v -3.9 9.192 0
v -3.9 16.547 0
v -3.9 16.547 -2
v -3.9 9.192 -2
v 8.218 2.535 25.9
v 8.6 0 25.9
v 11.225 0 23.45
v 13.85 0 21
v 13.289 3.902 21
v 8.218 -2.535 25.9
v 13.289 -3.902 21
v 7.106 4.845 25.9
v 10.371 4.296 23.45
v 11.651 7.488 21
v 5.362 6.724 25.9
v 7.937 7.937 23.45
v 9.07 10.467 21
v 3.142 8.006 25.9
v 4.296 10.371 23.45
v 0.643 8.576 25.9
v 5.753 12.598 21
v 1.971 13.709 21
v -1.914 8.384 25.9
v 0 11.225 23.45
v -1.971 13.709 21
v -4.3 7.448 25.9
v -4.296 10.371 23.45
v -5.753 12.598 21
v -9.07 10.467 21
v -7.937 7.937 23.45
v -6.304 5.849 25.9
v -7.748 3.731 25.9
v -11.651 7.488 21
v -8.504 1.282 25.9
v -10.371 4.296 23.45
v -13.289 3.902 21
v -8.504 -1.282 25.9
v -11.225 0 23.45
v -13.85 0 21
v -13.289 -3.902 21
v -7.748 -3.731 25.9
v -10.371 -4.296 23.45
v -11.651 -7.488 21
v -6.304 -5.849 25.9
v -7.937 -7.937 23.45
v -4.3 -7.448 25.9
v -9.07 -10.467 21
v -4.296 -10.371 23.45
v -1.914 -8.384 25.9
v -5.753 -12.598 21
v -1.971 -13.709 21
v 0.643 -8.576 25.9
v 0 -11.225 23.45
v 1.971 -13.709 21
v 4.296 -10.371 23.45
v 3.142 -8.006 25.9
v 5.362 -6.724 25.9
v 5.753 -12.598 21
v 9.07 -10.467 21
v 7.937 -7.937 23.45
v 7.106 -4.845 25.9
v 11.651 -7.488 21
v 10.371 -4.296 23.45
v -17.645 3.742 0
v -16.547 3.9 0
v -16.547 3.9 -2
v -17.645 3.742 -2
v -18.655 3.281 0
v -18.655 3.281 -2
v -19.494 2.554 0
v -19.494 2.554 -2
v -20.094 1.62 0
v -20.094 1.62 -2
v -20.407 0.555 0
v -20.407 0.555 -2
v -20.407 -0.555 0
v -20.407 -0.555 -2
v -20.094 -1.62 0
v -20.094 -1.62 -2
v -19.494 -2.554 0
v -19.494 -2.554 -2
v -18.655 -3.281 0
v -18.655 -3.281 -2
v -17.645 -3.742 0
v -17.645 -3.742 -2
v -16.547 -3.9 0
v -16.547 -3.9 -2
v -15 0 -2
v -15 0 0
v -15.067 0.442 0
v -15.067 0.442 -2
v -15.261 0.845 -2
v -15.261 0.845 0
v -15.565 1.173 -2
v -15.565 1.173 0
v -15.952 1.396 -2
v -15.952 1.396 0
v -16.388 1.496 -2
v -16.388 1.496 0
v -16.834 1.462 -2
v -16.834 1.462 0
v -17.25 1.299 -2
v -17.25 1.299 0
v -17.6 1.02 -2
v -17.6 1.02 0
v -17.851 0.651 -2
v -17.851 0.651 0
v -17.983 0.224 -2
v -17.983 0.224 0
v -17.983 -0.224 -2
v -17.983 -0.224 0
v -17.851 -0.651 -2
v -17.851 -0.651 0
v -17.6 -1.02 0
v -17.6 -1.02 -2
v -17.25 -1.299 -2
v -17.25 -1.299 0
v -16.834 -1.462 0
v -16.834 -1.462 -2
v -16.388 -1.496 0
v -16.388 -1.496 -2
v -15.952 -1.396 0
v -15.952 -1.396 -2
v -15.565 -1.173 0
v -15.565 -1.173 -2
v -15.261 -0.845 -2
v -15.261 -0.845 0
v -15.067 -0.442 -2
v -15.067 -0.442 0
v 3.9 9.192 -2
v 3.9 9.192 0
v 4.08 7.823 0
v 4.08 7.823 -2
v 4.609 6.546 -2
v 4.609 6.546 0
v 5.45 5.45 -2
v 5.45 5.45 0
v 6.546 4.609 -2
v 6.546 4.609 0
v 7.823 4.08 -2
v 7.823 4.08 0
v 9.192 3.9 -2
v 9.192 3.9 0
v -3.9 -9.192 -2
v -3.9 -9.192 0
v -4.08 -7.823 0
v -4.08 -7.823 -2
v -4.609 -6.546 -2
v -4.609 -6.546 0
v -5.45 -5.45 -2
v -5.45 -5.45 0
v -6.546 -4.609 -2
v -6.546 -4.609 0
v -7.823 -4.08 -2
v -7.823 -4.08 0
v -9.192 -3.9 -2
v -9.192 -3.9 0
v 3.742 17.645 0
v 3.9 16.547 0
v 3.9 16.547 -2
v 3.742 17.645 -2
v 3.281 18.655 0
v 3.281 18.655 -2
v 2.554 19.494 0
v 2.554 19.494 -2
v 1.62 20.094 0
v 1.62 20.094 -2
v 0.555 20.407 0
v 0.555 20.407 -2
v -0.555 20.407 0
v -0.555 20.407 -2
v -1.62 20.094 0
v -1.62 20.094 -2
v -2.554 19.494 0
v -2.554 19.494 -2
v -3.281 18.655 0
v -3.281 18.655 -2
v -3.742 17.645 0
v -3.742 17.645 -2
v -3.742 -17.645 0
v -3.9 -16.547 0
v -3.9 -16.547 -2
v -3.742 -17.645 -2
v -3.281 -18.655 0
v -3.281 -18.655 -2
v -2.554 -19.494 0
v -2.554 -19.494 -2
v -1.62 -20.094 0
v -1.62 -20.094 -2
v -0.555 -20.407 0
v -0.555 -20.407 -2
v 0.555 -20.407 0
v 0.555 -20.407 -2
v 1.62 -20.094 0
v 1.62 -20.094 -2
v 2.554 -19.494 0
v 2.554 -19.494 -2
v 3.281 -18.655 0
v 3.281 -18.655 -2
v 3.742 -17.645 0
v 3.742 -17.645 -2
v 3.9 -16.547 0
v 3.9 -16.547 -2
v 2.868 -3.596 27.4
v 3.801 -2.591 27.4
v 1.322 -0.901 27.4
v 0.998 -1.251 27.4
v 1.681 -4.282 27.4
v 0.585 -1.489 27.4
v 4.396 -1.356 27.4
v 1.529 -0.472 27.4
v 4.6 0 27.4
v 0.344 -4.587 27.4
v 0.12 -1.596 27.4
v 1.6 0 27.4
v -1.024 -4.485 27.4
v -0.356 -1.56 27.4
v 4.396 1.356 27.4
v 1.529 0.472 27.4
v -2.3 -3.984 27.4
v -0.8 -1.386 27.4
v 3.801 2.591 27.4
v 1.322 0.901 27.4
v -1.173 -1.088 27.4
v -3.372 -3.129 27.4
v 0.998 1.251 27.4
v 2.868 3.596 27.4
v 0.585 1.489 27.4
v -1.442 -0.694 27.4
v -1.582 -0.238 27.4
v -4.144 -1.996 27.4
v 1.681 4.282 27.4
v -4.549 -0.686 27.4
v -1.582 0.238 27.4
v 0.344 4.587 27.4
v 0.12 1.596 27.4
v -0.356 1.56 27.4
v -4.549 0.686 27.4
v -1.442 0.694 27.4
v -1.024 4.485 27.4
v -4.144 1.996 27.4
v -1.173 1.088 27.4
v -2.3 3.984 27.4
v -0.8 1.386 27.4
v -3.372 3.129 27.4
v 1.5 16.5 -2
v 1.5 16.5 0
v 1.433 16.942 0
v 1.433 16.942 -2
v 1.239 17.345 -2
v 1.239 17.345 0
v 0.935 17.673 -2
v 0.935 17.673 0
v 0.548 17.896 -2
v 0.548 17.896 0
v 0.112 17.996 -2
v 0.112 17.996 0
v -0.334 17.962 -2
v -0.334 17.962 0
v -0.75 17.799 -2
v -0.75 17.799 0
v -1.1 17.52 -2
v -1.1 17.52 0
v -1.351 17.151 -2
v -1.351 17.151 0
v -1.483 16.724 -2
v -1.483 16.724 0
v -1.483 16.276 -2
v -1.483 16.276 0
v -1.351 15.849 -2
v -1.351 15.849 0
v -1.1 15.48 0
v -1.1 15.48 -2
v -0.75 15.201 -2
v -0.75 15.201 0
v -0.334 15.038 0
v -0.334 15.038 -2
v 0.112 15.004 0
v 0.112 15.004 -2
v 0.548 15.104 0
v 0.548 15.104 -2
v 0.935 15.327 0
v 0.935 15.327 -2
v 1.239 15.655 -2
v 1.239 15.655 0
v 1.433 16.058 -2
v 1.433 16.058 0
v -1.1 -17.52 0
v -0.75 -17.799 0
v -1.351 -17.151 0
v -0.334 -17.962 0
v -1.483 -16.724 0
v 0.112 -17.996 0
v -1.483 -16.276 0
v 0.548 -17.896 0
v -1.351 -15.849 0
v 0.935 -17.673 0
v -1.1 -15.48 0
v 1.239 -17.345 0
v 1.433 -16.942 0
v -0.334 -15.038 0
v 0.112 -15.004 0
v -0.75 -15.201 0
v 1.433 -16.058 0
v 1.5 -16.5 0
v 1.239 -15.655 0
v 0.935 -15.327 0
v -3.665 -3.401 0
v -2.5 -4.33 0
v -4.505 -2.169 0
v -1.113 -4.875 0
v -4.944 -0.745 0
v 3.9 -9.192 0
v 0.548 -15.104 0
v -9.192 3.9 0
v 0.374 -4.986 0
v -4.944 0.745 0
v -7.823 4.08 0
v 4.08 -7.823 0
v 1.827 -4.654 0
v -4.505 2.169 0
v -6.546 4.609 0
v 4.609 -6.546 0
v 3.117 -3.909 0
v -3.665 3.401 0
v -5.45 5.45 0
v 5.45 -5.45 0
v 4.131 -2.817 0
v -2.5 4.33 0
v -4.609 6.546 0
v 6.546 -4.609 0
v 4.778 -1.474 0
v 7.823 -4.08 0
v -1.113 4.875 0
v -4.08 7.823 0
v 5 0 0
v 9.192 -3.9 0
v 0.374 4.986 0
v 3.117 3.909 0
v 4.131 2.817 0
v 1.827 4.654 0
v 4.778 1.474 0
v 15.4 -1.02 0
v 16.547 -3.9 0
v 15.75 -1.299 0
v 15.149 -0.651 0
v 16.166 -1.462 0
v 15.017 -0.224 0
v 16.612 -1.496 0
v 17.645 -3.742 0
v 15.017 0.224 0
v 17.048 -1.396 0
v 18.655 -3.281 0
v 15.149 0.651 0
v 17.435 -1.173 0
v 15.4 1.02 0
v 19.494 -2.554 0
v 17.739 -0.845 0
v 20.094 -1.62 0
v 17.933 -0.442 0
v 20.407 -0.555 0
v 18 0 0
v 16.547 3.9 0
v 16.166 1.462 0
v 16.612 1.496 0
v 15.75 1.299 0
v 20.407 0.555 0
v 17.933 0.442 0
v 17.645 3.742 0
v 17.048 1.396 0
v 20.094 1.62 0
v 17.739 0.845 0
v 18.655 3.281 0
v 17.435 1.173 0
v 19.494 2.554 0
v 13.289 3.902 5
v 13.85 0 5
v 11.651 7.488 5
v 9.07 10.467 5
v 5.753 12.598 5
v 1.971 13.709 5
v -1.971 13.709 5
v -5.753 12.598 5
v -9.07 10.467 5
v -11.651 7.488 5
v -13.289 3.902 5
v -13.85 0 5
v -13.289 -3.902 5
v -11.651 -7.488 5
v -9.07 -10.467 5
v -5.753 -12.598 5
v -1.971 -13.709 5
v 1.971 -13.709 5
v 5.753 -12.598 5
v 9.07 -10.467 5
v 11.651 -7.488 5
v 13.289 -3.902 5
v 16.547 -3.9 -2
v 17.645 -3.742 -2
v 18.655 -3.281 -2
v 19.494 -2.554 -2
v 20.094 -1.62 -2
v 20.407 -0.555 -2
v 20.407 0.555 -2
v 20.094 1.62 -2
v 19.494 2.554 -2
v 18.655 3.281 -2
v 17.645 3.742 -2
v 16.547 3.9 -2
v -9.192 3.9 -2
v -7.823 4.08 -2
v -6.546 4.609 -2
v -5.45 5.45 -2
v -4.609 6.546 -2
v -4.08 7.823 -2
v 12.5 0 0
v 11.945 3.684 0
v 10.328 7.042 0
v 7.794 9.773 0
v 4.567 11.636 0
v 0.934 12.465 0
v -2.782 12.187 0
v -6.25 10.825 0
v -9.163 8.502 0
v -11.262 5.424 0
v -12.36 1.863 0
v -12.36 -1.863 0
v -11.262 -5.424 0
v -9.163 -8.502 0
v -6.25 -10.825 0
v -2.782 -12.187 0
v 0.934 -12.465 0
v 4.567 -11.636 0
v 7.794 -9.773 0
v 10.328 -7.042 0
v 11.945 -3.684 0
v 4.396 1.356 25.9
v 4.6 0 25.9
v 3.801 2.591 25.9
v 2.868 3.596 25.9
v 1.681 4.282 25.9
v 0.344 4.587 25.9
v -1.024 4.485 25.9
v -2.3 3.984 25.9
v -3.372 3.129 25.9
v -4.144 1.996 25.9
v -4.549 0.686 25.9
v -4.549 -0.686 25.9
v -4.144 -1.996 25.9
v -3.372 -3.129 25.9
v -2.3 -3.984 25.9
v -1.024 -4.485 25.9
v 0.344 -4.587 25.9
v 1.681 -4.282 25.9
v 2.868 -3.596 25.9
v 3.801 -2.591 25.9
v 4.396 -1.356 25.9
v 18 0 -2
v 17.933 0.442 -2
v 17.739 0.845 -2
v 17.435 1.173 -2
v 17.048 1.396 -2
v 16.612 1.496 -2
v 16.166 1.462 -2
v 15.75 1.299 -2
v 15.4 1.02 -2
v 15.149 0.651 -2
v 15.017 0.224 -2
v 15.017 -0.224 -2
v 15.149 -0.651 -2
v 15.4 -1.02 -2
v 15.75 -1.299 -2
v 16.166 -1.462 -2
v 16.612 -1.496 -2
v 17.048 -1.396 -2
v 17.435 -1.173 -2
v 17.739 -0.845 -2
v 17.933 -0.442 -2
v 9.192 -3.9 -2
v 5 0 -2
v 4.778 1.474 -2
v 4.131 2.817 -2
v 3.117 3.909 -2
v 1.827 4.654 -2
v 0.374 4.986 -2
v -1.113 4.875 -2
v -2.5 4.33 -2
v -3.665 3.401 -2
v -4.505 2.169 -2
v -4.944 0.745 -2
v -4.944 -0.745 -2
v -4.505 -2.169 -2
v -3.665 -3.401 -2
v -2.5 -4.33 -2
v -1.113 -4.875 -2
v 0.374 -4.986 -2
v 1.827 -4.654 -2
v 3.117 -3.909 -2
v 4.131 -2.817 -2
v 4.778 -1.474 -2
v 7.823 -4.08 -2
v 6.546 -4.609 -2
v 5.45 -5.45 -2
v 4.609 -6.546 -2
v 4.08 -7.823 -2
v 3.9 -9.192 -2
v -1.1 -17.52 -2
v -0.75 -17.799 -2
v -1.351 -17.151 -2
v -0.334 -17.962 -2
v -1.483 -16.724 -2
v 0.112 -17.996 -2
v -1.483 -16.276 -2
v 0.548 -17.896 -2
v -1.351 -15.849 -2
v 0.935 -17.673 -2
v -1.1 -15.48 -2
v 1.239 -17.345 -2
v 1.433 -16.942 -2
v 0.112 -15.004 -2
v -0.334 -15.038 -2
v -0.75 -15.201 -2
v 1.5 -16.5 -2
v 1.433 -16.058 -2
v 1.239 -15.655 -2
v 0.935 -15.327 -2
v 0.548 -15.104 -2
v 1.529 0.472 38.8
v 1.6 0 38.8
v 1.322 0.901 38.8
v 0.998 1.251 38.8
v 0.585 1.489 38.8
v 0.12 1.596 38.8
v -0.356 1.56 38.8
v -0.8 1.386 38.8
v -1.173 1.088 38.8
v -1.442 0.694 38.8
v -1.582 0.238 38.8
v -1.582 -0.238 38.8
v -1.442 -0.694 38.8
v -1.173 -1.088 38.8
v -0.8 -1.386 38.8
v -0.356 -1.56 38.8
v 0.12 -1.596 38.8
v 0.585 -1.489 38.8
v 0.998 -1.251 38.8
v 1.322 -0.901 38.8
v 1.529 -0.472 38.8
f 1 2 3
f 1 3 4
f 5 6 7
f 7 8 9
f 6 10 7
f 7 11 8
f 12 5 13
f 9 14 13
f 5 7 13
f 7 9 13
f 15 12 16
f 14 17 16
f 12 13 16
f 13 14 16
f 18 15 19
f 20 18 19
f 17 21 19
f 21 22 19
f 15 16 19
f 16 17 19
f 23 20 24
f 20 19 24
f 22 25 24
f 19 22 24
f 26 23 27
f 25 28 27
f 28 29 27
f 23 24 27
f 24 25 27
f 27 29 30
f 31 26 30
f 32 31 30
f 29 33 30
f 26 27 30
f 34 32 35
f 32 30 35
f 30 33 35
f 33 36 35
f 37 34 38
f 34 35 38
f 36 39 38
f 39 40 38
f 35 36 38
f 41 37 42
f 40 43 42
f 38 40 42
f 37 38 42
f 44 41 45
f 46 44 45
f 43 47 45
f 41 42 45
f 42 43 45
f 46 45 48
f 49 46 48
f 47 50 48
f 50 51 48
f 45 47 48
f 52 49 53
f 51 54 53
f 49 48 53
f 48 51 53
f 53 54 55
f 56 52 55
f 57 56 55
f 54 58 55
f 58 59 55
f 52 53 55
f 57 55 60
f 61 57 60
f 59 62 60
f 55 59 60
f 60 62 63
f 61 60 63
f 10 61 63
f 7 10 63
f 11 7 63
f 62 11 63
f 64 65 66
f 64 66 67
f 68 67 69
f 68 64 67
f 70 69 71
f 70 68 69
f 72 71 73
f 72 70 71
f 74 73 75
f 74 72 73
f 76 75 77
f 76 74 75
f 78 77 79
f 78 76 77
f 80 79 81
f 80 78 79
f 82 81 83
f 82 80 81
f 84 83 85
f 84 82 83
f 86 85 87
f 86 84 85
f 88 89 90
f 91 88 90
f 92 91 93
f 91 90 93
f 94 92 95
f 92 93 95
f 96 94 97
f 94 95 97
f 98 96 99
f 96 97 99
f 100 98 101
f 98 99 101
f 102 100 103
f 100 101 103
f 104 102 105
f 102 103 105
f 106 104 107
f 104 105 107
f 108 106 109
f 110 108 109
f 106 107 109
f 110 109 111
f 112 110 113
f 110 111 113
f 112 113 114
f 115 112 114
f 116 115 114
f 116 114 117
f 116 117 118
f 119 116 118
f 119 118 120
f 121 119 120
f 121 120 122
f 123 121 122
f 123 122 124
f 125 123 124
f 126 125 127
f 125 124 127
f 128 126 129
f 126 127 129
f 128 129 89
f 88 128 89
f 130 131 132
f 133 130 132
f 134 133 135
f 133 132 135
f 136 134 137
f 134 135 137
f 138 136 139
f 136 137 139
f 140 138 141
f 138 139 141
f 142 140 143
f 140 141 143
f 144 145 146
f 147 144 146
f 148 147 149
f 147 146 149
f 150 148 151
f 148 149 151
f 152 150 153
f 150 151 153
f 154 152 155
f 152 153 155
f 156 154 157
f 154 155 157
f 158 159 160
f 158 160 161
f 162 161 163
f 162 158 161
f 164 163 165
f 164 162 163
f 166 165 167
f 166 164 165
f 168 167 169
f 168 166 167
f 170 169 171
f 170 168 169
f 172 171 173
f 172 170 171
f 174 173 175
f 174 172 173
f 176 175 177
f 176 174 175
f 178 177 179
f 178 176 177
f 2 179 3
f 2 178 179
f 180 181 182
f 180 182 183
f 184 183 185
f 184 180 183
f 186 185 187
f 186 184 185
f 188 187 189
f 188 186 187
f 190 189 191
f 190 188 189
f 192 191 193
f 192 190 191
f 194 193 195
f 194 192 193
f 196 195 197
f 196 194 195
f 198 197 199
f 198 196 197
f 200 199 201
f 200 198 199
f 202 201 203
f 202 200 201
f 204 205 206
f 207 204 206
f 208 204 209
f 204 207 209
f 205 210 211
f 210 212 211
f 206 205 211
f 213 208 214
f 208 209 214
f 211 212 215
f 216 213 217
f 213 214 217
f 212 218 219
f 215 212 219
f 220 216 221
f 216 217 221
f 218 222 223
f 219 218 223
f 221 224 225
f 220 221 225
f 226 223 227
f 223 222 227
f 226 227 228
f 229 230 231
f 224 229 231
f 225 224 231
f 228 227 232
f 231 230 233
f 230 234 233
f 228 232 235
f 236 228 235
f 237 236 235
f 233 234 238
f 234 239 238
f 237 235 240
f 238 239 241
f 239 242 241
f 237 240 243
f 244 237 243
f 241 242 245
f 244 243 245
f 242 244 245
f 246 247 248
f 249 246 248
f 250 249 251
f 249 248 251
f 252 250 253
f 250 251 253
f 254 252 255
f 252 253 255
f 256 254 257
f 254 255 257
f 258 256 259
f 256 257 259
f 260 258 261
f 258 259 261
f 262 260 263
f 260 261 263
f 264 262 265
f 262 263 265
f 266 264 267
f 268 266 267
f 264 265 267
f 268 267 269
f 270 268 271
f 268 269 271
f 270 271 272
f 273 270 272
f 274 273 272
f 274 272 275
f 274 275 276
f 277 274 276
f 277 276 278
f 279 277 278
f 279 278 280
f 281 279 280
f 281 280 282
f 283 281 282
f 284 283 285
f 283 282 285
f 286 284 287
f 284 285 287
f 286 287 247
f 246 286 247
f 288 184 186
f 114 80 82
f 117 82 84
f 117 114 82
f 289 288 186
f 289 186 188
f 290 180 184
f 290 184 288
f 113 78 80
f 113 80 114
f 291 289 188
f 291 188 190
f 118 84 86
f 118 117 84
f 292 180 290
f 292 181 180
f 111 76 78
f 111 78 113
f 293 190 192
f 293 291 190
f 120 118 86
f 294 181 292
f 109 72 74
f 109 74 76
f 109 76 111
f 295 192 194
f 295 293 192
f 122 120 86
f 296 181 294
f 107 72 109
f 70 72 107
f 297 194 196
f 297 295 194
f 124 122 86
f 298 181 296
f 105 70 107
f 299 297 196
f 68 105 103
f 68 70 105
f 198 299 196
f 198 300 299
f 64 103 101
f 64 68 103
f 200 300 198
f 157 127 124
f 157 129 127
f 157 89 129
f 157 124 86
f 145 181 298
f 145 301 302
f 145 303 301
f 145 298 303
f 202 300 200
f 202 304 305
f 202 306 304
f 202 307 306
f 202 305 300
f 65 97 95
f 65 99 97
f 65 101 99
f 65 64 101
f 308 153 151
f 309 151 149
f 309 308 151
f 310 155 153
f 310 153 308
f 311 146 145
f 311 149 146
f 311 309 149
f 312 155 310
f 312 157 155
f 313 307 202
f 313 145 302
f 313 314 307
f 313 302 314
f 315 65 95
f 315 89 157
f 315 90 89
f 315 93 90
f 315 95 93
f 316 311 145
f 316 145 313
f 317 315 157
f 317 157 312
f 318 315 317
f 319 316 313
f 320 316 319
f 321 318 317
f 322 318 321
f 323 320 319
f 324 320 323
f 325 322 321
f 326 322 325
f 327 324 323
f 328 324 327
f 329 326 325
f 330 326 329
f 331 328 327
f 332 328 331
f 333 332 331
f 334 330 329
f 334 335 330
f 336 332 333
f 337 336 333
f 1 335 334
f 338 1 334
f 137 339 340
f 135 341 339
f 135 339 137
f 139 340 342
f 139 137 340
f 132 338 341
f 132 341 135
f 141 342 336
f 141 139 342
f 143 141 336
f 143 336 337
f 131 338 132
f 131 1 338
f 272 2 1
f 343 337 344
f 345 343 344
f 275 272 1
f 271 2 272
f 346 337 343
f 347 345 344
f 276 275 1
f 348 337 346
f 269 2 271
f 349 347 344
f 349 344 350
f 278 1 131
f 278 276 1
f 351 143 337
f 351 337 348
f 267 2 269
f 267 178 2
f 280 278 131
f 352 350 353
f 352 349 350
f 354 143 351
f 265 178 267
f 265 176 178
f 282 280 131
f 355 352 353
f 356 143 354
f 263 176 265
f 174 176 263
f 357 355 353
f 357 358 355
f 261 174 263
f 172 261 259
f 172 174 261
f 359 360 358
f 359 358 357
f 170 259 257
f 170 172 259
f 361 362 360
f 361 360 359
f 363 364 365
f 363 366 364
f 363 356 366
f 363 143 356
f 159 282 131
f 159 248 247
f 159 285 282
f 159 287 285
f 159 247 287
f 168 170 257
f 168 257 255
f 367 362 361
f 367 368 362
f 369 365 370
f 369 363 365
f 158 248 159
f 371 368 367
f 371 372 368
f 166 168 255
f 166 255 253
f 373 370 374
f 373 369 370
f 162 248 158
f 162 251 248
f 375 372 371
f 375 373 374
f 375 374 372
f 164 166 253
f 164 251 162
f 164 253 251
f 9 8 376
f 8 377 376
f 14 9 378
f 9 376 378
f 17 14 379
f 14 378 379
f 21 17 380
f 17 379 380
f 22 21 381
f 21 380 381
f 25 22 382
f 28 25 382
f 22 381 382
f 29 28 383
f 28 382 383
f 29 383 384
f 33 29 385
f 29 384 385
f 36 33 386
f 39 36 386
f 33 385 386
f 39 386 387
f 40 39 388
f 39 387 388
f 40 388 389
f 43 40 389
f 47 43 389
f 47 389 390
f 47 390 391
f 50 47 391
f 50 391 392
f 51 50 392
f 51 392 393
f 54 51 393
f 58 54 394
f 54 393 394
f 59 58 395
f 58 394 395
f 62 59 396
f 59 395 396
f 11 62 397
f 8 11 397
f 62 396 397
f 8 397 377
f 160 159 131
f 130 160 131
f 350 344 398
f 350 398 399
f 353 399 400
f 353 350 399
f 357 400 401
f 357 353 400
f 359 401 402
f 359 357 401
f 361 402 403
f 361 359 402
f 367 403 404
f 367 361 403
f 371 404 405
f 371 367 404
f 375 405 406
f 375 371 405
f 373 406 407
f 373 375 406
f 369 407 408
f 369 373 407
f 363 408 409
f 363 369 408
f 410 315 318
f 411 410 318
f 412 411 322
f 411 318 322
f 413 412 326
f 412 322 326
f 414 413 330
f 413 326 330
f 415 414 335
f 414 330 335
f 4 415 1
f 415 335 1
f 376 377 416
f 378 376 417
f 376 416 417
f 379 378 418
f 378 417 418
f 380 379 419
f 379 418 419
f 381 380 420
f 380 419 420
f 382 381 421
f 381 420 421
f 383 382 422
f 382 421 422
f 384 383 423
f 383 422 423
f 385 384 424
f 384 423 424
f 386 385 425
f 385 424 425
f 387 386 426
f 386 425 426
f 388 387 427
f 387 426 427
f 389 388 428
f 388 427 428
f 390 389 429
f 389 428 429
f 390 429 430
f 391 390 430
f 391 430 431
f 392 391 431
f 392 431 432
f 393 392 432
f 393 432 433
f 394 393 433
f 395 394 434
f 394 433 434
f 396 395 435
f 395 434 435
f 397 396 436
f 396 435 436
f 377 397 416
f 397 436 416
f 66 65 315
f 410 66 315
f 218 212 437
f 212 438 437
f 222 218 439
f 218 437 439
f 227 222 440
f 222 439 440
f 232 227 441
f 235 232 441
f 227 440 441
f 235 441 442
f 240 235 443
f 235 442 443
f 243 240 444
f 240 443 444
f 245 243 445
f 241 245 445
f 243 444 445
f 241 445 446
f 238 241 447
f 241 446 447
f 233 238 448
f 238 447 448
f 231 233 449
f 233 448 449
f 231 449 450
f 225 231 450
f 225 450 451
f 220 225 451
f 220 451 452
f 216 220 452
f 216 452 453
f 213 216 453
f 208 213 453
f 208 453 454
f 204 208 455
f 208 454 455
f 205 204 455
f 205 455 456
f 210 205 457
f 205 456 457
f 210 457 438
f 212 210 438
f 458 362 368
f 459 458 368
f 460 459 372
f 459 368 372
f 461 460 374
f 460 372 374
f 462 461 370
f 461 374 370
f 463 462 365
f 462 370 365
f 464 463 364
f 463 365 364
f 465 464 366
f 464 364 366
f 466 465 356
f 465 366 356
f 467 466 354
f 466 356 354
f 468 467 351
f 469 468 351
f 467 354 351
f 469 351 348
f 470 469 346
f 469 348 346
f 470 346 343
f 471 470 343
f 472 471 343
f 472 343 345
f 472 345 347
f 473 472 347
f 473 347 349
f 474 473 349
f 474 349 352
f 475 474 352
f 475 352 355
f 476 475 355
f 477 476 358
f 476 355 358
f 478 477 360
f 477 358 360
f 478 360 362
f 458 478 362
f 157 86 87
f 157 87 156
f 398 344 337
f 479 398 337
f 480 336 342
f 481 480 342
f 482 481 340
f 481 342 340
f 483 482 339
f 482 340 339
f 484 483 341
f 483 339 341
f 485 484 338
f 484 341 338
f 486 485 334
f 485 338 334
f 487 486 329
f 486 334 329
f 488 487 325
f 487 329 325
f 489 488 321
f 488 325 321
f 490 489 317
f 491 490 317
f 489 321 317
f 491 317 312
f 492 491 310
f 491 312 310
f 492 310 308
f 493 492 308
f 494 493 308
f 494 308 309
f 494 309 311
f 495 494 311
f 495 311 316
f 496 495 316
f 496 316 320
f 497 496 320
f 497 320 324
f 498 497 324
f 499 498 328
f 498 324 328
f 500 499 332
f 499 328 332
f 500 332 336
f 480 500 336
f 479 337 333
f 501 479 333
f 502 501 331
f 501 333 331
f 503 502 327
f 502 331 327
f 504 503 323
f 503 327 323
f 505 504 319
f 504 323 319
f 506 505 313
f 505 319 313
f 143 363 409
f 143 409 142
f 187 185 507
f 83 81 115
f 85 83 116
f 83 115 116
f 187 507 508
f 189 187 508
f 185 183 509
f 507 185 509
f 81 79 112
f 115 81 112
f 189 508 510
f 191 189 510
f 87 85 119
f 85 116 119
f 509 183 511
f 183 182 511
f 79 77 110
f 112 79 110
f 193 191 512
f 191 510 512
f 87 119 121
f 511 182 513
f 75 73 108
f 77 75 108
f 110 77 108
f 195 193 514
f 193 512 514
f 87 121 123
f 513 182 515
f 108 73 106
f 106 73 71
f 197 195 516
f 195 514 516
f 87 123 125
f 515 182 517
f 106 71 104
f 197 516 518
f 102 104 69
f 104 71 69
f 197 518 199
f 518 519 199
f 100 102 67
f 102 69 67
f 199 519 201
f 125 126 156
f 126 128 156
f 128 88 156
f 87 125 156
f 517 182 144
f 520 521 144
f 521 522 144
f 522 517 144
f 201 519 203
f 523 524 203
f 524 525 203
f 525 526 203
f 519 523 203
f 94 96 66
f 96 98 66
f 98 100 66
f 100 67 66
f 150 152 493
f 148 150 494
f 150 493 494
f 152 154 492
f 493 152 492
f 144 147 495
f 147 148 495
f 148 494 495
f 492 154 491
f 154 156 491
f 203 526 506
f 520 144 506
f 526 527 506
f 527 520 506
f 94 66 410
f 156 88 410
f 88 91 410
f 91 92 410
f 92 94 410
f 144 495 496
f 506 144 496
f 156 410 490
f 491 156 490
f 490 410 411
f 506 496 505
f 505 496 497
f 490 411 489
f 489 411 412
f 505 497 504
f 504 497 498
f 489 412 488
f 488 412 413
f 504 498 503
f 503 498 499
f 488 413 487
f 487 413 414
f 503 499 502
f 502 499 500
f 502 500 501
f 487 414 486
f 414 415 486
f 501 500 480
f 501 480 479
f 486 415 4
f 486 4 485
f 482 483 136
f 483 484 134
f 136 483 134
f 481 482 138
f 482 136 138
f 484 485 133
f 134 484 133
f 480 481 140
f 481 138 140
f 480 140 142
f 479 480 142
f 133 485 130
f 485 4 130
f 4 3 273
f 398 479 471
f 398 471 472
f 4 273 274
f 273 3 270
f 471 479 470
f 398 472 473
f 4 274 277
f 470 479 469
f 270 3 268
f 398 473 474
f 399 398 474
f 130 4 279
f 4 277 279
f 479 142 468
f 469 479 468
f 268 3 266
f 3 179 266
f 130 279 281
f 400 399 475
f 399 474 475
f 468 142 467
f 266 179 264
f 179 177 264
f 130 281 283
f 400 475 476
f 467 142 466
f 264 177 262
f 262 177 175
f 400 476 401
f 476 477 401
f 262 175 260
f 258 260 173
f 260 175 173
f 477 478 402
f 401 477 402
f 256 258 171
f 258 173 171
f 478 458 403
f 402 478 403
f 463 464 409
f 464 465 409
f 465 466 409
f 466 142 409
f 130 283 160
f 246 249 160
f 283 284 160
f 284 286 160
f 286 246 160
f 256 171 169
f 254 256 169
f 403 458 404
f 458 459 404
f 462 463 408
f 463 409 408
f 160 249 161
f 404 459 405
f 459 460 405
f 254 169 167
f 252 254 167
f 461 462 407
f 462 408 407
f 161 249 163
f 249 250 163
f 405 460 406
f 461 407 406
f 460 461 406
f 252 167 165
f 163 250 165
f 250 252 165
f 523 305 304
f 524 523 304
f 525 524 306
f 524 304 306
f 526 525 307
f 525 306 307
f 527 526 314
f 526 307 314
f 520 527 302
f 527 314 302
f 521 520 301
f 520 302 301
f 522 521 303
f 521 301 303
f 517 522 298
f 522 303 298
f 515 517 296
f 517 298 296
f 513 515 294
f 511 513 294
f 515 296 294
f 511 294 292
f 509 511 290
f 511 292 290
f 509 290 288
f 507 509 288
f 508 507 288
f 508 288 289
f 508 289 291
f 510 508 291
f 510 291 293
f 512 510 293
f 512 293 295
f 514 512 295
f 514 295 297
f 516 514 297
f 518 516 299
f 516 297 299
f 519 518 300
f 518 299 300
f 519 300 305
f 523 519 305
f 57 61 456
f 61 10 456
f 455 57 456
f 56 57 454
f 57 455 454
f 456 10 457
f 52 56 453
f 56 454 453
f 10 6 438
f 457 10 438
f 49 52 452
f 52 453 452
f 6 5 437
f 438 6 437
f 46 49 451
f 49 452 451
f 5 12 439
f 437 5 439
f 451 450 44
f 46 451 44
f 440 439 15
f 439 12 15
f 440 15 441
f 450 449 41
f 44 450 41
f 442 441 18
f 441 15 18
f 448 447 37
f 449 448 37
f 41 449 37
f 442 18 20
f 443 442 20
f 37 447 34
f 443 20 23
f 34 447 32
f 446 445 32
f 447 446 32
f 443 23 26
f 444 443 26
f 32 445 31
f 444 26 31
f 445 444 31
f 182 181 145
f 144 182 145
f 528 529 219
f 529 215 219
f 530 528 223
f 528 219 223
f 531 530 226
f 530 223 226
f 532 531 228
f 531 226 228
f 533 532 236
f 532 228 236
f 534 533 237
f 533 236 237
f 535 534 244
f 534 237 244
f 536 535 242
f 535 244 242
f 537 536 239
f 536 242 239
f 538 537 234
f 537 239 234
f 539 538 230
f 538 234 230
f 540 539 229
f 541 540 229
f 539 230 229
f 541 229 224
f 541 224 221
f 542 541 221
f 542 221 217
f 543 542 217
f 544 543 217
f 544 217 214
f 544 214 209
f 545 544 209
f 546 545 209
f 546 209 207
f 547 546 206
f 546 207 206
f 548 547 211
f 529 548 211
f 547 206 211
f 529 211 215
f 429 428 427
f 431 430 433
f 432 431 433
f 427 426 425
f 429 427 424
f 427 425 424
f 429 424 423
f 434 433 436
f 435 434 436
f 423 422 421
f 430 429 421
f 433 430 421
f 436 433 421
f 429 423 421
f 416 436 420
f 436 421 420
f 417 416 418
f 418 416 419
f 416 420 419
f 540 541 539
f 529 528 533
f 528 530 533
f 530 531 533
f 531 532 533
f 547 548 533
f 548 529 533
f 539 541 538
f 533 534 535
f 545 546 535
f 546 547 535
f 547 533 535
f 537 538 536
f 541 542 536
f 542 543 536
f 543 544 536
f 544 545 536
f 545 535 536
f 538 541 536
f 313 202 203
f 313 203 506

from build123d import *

# Parameters (mm, degrees)
SKETCH001_R   = 5
SKETCH001_R_2 = 1.5
PAD_DEPTH     = 2


with BuildPart() as body:
    # Sketch → Revolution (revolve)
    with BuildSketch(Plane.XZ):
        Polygon((0, 0), (0, 38.8), (1.6, 38.8), (1.6, 27.4), (4.6, 27.4), (4.6, 25.9), (8.6, 25.9), (13.85, 21), (13.85, 5), (12.5, 0), align=None)
    revolve(axis=Axis((0, 0, 0), (0, 0, 1)))


with BuildPart() as body001:
    # Sketch001 → Pad (new body)
    with BuildSketch(Plane.XY):
        with BuildLine():
            ThreePointArc((-16.546601, 3.9), (-20.446601, 0), (-16.546601, -3.9))
            Line((-16.546601, -3.9), (-9.192388, -3.9))
            ThreePointArc((-3.9, -9.192388), (-5.450105, -5.450105), (-9.192388, -3.9))
            Line((-3.9, -16.546601), (-3.9, -9.192388))
            ThreePointArc((-3.9, -16.546601), (0, -20.446601), (3.9, -16.546601))
            Line((3.9, -16.546601), (3.9, -9.192388))
            ThreePointArc((9.192388, -3.9), (5.450105, -5.450105), (3.9, -9.192388))
            Line((16.546601, -3.9), (9.192388, -3.9))
            ThreePointArc((16.546601, -3.9), (20.446601, 0), (16.546601, 3.9))
            Line((16.546601, 3.9), (9.192388, 3.9))
            ThreePointArc((3.9, 9.192388), (5.450105, 5.450105), (9.192388, 3.9))
            Line((3.9, 16.546601), (3.9, 9.192388))
            ThreePointArc((3.9, 16.546601), (0, 20.446601), (-3.9, 16.546601))
            Line((-3.9, 16.546601), (-3.9, 9.192388))
            ThreePointArc((-9.192388, 3.9), (-5.450105, 5.450105), (-3.9, 9.192388))
            Line((-16.546601, 3.9), (-9.192388, 3.9))
        make_face()
        Circle(SKETCH001_R, mode=Mode.SUBTRACT)
        with Locations((0, 16.5)):
            Circle(SKETCH001_R_2, mode=Mode.SUBTRACT)
        with Locations((16.5, 0)):
            Circle(SKETCH001_R_2, mode=Mode.SUBTRACT)
        with Locations((0, -16.5)):
            Circle(SKETCH001_R_2, mode=Mode.SUBTRACT)
        with Locations((-16.5, 0)):
            Circle(SKETCH001_R_2, mode=Mode.SUBTRACT)
    extrude(amount=-PAD_DEPTH)


solid = Compound([body.part, body001.part])
